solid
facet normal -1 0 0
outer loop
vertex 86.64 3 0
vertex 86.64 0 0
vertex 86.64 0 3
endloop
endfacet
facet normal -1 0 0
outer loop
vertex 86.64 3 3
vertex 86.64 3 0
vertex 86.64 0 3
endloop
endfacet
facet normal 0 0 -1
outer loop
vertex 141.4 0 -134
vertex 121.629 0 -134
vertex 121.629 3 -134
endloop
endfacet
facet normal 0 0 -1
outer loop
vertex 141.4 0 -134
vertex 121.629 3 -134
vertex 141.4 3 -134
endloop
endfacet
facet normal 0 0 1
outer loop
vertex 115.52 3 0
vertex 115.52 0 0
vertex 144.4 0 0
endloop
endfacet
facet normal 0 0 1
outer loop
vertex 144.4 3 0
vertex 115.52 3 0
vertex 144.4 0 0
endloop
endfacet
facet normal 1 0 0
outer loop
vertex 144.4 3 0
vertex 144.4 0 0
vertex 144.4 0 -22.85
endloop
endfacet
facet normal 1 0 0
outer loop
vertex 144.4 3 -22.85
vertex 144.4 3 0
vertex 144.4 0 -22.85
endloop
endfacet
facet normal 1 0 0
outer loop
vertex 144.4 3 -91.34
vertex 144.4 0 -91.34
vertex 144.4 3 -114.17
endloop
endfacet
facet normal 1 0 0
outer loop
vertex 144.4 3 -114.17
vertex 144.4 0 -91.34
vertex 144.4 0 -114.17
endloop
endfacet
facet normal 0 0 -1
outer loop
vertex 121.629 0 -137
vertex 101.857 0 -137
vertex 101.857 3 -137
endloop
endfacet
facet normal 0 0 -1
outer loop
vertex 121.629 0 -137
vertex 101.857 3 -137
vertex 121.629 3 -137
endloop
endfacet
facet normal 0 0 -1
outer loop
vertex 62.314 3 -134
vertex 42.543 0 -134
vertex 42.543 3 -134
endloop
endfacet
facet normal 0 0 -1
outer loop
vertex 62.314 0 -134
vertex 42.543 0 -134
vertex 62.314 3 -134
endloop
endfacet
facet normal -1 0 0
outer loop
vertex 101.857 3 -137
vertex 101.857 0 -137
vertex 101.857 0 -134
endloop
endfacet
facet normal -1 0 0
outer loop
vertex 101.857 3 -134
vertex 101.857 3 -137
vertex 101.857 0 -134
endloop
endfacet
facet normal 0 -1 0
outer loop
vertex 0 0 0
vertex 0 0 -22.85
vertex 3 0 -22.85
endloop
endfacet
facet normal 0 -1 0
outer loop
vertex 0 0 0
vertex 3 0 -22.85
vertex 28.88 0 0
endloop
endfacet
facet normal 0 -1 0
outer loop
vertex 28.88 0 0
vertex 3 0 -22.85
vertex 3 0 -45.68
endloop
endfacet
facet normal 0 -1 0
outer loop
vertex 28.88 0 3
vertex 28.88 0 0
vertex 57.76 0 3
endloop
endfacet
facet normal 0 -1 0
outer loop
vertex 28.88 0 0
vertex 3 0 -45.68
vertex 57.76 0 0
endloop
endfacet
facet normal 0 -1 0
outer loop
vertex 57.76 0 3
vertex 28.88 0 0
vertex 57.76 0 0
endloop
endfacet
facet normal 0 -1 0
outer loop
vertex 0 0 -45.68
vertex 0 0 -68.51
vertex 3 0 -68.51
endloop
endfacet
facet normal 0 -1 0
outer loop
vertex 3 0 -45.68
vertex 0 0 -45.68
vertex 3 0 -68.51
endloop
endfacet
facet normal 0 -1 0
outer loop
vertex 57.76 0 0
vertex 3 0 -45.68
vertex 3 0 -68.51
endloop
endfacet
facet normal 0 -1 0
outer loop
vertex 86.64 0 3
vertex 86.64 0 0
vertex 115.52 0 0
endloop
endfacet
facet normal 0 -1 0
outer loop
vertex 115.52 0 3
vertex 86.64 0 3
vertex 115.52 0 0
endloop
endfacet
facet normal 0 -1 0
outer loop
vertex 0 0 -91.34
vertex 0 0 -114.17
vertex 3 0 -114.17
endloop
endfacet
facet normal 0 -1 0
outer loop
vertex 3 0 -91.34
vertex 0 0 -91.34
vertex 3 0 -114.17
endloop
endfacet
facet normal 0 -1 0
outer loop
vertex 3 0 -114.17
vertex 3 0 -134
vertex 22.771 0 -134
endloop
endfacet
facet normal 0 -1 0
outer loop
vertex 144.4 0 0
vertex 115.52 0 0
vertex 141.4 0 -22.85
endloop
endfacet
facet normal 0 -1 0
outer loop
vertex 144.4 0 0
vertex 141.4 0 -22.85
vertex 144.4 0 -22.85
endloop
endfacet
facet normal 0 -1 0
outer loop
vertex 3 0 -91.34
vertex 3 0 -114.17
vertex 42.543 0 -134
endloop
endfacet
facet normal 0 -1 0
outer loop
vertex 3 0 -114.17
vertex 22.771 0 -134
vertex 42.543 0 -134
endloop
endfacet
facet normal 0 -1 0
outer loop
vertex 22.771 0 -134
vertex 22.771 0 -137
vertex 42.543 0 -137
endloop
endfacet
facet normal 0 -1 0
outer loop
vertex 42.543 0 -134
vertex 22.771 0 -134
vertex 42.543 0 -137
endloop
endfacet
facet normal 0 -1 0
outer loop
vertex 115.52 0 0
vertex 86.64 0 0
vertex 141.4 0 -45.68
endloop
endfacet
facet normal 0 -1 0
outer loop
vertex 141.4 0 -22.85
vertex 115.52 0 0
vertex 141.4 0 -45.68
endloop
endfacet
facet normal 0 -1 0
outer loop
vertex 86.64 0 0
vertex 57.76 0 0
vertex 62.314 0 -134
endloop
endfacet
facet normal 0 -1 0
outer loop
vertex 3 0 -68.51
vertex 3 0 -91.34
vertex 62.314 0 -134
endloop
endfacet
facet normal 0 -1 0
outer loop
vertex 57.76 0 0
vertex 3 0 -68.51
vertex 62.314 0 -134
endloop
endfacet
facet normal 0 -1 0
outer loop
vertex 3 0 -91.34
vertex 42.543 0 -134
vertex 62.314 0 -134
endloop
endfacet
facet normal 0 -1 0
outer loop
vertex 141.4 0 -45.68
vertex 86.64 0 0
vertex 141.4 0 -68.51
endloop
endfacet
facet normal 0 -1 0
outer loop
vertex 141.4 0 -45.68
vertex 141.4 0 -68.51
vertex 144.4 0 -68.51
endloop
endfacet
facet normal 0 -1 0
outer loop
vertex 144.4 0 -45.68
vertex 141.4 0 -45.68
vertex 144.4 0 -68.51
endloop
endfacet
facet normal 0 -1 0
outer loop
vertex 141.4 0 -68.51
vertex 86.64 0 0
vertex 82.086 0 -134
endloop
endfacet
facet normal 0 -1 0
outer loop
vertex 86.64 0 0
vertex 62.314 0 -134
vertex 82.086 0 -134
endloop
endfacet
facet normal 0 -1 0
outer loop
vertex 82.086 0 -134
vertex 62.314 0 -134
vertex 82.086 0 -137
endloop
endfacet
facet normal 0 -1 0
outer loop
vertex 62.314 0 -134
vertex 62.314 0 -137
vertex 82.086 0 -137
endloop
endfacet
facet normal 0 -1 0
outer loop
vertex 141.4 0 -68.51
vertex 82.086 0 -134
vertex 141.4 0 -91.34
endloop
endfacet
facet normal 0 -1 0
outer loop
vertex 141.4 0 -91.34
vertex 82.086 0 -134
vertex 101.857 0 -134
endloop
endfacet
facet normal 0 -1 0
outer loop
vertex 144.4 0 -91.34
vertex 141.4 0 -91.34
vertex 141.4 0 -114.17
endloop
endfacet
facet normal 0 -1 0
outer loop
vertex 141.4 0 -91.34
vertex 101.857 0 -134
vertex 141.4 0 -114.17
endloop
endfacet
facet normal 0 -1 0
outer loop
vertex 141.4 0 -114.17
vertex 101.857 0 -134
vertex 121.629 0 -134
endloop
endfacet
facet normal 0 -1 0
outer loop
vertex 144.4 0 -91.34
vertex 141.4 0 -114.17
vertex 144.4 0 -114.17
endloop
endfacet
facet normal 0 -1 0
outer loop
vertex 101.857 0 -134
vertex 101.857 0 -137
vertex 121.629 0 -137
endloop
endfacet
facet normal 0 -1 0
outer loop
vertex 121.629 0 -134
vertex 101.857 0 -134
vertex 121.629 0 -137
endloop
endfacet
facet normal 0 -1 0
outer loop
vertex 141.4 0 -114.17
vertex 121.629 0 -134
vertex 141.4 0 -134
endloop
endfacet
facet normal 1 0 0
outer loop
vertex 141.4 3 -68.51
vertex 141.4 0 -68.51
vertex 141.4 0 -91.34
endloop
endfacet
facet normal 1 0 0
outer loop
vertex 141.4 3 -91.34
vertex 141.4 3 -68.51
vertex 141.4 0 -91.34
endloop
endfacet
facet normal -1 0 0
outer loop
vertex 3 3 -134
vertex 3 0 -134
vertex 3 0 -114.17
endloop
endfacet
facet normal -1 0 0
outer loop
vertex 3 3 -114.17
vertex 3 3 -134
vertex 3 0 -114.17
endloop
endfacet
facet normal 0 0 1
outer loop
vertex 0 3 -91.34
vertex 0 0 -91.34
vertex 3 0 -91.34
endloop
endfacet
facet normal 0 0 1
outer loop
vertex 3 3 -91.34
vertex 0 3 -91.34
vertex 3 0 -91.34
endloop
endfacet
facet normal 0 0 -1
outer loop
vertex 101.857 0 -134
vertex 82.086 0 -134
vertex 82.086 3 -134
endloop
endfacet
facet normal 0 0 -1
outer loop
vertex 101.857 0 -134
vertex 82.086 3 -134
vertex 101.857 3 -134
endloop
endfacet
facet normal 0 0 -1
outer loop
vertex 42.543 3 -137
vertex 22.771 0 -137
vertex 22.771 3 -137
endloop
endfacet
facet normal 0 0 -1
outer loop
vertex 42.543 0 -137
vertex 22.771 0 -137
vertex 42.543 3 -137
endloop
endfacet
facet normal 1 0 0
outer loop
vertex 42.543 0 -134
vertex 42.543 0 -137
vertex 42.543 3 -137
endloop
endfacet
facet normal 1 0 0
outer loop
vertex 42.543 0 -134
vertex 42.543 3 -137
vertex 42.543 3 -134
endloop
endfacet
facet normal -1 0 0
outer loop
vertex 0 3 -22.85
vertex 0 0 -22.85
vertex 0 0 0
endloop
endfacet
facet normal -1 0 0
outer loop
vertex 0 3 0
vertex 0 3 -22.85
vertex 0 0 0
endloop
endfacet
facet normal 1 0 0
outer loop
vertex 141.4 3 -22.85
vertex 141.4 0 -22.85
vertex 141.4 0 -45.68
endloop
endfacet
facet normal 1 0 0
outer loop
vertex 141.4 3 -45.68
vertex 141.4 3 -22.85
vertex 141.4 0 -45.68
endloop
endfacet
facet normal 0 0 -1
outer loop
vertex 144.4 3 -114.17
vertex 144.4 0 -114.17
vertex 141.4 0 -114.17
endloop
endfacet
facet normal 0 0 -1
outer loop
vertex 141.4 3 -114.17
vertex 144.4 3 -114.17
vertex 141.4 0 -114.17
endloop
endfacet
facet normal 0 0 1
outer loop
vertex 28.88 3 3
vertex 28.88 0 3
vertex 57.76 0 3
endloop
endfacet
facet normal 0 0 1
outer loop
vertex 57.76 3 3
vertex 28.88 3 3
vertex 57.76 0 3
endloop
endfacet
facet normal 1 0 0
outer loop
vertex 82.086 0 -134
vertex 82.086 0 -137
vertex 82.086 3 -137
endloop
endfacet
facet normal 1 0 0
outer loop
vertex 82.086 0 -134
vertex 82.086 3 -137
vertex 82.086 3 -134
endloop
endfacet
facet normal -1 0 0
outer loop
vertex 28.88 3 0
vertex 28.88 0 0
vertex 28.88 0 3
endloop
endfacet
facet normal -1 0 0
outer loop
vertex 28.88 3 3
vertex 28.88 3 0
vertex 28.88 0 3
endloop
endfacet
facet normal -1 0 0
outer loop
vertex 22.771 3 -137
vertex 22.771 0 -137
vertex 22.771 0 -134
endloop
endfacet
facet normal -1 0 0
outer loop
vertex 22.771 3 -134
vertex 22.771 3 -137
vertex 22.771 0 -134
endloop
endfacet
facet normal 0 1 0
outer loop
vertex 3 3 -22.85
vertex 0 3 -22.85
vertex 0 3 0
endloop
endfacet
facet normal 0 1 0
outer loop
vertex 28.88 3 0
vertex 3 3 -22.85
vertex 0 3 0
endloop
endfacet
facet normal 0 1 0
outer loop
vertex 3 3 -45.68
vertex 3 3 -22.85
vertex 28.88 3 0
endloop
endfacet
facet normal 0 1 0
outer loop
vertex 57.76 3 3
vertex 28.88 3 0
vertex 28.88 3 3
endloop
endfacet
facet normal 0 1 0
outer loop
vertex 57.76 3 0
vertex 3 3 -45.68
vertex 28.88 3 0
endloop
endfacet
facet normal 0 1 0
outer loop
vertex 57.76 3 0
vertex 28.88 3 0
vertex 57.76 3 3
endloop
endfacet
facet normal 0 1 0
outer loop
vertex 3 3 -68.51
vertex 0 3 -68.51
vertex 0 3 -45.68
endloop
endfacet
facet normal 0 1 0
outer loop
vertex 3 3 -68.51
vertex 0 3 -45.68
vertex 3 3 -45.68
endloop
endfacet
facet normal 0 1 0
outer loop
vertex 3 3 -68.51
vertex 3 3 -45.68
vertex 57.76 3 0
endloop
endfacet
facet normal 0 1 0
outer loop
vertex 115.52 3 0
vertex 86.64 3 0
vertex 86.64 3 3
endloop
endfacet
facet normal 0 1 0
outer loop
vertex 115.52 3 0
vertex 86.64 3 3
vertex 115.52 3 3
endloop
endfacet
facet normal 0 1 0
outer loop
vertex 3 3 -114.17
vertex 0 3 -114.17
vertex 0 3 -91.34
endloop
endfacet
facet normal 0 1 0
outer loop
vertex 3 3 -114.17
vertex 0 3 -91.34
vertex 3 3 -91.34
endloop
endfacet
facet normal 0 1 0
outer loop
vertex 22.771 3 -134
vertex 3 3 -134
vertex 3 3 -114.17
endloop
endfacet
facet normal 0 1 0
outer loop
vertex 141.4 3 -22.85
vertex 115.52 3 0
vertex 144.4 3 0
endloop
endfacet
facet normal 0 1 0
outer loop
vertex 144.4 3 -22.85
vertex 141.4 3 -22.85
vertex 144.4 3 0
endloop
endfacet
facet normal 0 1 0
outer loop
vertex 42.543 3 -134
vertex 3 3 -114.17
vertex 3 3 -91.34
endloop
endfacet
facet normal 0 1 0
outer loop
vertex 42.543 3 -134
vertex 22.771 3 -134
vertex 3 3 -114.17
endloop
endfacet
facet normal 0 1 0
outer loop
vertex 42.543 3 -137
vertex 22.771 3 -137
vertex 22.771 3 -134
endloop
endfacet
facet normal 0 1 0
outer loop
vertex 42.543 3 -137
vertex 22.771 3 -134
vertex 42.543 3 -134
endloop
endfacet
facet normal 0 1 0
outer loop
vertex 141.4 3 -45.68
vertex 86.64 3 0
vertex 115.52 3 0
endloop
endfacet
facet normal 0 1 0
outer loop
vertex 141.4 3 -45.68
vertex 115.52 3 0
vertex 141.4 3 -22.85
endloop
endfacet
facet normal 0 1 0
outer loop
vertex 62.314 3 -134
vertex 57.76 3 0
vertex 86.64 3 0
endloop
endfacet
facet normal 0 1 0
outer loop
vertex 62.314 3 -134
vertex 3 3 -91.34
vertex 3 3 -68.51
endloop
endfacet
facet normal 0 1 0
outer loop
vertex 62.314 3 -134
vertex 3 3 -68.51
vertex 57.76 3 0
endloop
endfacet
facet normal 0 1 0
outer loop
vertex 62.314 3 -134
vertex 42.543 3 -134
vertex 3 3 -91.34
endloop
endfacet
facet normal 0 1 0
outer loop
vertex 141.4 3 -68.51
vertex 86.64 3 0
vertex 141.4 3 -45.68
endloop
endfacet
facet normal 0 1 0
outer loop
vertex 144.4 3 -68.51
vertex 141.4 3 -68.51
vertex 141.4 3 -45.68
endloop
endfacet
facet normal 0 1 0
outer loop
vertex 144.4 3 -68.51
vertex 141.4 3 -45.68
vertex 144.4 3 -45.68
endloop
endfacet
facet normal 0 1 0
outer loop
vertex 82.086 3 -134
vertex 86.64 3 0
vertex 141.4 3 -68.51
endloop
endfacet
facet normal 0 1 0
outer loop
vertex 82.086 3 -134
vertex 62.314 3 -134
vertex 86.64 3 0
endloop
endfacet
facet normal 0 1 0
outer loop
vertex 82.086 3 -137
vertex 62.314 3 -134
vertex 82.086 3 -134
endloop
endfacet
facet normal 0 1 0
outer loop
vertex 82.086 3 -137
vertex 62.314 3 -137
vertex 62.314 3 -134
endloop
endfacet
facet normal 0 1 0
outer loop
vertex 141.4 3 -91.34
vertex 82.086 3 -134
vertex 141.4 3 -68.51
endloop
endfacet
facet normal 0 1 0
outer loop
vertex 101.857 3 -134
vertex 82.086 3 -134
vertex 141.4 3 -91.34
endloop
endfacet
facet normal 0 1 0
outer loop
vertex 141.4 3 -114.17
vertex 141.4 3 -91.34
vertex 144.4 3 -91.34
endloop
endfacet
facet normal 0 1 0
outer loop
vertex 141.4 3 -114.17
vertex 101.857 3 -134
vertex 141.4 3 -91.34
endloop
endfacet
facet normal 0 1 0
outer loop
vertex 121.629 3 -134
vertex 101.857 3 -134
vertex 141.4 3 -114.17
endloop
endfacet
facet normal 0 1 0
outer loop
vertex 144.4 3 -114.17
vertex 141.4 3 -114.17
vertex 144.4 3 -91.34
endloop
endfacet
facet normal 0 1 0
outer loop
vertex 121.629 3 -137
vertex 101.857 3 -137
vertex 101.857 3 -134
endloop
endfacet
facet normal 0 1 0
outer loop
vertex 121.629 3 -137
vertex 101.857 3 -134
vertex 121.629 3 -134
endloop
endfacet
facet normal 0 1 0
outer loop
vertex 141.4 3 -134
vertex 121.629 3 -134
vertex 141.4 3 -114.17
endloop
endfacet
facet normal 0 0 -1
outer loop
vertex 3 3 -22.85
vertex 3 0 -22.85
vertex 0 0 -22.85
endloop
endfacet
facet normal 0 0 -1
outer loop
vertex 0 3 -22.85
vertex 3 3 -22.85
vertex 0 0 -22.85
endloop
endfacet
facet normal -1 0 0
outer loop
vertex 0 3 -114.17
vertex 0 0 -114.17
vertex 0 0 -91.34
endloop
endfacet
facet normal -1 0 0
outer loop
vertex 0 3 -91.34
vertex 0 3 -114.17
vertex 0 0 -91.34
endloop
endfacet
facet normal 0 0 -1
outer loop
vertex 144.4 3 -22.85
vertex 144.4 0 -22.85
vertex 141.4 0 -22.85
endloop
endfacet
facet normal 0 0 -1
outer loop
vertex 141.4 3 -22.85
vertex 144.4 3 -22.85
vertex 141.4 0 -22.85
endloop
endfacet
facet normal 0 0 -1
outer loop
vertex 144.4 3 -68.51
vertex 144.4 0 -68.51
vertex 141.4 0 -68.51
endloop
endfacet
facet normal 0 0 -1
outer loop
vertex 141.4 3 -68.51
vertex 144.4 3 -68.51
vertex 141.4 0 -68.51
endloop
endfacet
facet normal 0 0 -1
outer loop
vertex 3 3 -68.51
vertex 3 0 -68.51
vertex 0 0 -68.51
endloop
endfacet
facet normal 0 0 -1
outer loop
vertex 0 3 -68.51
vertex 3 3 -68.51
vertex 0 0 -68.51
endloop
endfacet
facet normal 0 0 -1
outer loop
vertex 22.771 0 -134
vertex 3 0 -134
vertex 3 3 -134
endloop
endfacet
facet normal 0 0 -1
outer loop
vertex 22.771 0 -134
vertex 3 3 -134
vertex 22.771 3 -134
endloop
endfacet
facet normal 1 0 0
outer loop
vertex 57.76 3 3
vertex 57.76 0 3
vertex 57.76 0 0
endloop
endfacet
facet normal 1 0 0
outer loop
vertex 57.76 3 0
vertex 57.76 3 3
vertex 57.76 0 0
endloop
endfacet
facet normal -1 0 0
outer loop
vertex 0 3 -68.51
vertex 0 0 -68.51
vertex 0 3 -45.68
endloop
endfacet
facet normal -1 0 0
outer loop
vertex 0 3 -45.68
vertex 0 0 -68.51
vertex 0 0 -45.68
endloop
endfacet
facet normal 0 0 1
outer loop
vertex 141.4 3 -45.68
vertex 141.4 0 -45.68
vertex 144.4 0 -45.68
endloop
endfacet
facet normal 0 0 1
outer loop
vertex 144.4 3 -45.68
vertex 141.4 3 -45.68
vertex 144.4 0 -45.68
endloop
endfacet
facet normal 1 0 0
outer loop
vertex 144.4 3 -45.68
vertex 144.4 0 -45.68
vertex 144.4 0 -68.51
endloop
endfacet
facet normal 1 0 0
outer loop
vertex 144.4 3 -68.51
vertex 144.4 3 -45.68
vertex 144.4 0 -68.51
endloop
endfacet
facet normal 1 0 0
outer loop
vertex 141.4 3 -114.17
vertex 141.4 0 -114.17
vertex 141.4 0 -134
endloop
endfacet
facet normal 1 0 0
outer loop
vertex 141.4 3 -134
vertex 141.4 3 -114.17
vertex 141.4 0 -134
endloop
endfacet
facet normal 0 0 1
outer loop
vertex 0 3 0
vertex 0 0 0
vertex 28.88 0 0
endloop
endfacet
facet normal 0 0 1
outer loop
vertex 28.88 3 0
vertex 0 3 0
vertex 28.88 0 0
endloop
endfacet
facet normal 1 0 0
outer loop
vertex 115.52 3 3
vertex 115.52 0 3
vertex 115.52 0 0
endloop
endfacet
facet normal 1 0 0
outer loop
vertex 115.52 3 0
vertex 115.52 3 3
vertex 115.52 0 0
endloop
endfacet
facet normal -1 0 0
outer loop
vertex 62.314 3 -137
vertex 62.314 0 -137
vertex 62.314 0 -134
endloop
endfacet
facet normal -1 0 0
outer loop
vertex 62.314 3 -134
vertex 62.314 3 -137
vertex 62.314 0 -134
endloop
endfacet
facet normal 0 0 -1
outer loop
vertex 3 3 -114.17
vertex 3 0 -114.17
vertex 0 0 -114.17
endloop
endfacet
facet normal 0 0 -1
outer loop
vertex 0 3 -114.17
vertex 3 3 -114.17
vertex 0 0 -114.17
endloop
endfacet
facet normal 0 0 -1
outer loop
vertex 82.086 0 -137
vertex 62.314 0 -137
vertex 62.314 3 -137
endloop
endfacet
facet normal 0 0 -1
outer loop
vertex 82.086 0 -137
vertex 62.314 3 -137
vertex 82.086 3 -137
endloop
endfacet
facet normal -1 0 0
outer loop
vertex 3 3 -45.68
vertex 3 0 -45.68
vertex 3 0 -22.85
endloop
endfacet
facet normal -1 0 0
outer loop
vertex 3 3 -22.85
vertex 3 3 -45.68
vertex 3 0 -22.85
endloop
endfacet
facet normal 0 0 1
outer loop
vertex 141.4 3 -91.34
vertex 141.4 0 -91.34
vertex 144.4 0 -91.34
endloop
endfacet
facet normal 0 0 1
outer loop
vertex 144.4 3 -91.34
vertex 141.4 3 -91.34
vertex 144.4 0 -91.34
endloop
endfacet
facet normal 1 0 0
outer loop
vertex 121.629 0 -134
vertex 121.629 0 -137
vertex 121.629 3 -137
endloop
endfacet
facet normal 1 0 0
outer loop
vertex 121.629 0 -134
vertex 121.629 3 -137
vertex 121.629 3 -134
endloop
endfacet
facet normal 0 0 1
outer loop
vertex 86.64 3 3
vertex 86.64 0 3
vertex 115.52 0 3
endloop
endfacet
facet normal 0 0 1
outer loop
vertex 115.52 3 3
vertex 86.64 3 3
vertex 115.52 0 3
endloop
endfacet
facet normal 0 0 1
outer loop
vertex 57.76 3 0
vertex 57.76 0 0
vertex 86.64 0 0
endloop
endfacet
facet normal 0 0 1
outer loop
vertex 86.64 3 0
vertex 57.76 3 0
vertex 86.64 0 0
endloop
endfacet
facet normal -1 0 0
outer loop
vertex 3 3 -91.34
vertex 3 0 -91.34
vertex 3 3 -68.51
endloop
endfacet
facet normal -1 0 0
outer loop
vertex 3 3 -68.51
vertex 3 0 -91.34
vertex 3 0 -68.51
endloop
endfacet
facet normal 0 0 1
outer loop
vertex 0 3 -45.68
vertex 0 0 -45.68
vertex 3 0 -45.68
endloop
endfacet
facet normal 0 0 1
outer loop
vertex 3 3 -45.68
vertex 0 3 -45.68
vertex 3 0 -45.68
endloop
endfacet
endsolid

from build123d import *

# Parameters (mm, degrees)
BOSS_EXTRUDE1_DEPTH = 3
SKETCH2_W           = 138.4
SKETCH2_H           = 3
CUT_EXTRUDE1_DEPTH  = 4
SKETCH3_W           = 19.771429
SKETCH3_H           = 3
BOSS_EXTRUDE2_DEPTH = 3


with BuildPart() as part:
    # Sketch1 → Boss-Extrude1 (new body)
    with BuildSketch(Plane(origin=(0, 0, 0), x_dir=(1, 0, 0), z_dir=(0, 1, 0))):
        Polygon((0, 0), (28.88, 0), (28.88, -3), (57.76, -3), (57.76, 0), (86.64, 0), (86.64, -3), (115.52, -3), (115.52, 0), (144.4, 0), (144.4, 22.85), (141.4, 22.85), (141.4, 45.68), (144.4, 45.68), (144.4, 68.51), (141.4, 68.51), (141.4, 91.34), (144.4, 91.34), (144.4, 114.17), (141.4, 114.17), (141.4, 137), (3, 137), (3, 114.17), (0, 114.17), (0, 91.34), (3, 91.34), (3, 68.51), (0, 68.51), (0, 45.68), (3, 45.68), (3, 22.85), (0, 22.85), align=None)
    extrude(amount=BOSS_EXTRUDE1_DEPTH)

    # Sketch2 → Cut-Extrude1 (cut, through all)
    with BuildSketch(Plane.XZ):
        with Locations((72.2, -135.5)):
            Rectangle(SKETCH2_W, SKETCH2_H)
    extrude(amount=-CUT_EXTRUDE1_DEPTH, mode=Mode.SUBTRACT)

    # Sketch3 → Boss-Extrude2 (add)
    with BuildSketch(Plane.XZ):
        with Locations((32.657143071, -135.5)):
            Rectangle(SKETCH3_W, SKETCH3_H)
        with Locations((72.200001071, -135.5)):
            Rectangle(SKETCH3_W, SKETCH3_H)
        with Locations((111.742859071, -135.5)):
            Rectangle(SKETCH3_W, SKETCH3_H)
    extrude(amount=-BOSS_EXTRUDE2_DEPTH)


solid = part.part
